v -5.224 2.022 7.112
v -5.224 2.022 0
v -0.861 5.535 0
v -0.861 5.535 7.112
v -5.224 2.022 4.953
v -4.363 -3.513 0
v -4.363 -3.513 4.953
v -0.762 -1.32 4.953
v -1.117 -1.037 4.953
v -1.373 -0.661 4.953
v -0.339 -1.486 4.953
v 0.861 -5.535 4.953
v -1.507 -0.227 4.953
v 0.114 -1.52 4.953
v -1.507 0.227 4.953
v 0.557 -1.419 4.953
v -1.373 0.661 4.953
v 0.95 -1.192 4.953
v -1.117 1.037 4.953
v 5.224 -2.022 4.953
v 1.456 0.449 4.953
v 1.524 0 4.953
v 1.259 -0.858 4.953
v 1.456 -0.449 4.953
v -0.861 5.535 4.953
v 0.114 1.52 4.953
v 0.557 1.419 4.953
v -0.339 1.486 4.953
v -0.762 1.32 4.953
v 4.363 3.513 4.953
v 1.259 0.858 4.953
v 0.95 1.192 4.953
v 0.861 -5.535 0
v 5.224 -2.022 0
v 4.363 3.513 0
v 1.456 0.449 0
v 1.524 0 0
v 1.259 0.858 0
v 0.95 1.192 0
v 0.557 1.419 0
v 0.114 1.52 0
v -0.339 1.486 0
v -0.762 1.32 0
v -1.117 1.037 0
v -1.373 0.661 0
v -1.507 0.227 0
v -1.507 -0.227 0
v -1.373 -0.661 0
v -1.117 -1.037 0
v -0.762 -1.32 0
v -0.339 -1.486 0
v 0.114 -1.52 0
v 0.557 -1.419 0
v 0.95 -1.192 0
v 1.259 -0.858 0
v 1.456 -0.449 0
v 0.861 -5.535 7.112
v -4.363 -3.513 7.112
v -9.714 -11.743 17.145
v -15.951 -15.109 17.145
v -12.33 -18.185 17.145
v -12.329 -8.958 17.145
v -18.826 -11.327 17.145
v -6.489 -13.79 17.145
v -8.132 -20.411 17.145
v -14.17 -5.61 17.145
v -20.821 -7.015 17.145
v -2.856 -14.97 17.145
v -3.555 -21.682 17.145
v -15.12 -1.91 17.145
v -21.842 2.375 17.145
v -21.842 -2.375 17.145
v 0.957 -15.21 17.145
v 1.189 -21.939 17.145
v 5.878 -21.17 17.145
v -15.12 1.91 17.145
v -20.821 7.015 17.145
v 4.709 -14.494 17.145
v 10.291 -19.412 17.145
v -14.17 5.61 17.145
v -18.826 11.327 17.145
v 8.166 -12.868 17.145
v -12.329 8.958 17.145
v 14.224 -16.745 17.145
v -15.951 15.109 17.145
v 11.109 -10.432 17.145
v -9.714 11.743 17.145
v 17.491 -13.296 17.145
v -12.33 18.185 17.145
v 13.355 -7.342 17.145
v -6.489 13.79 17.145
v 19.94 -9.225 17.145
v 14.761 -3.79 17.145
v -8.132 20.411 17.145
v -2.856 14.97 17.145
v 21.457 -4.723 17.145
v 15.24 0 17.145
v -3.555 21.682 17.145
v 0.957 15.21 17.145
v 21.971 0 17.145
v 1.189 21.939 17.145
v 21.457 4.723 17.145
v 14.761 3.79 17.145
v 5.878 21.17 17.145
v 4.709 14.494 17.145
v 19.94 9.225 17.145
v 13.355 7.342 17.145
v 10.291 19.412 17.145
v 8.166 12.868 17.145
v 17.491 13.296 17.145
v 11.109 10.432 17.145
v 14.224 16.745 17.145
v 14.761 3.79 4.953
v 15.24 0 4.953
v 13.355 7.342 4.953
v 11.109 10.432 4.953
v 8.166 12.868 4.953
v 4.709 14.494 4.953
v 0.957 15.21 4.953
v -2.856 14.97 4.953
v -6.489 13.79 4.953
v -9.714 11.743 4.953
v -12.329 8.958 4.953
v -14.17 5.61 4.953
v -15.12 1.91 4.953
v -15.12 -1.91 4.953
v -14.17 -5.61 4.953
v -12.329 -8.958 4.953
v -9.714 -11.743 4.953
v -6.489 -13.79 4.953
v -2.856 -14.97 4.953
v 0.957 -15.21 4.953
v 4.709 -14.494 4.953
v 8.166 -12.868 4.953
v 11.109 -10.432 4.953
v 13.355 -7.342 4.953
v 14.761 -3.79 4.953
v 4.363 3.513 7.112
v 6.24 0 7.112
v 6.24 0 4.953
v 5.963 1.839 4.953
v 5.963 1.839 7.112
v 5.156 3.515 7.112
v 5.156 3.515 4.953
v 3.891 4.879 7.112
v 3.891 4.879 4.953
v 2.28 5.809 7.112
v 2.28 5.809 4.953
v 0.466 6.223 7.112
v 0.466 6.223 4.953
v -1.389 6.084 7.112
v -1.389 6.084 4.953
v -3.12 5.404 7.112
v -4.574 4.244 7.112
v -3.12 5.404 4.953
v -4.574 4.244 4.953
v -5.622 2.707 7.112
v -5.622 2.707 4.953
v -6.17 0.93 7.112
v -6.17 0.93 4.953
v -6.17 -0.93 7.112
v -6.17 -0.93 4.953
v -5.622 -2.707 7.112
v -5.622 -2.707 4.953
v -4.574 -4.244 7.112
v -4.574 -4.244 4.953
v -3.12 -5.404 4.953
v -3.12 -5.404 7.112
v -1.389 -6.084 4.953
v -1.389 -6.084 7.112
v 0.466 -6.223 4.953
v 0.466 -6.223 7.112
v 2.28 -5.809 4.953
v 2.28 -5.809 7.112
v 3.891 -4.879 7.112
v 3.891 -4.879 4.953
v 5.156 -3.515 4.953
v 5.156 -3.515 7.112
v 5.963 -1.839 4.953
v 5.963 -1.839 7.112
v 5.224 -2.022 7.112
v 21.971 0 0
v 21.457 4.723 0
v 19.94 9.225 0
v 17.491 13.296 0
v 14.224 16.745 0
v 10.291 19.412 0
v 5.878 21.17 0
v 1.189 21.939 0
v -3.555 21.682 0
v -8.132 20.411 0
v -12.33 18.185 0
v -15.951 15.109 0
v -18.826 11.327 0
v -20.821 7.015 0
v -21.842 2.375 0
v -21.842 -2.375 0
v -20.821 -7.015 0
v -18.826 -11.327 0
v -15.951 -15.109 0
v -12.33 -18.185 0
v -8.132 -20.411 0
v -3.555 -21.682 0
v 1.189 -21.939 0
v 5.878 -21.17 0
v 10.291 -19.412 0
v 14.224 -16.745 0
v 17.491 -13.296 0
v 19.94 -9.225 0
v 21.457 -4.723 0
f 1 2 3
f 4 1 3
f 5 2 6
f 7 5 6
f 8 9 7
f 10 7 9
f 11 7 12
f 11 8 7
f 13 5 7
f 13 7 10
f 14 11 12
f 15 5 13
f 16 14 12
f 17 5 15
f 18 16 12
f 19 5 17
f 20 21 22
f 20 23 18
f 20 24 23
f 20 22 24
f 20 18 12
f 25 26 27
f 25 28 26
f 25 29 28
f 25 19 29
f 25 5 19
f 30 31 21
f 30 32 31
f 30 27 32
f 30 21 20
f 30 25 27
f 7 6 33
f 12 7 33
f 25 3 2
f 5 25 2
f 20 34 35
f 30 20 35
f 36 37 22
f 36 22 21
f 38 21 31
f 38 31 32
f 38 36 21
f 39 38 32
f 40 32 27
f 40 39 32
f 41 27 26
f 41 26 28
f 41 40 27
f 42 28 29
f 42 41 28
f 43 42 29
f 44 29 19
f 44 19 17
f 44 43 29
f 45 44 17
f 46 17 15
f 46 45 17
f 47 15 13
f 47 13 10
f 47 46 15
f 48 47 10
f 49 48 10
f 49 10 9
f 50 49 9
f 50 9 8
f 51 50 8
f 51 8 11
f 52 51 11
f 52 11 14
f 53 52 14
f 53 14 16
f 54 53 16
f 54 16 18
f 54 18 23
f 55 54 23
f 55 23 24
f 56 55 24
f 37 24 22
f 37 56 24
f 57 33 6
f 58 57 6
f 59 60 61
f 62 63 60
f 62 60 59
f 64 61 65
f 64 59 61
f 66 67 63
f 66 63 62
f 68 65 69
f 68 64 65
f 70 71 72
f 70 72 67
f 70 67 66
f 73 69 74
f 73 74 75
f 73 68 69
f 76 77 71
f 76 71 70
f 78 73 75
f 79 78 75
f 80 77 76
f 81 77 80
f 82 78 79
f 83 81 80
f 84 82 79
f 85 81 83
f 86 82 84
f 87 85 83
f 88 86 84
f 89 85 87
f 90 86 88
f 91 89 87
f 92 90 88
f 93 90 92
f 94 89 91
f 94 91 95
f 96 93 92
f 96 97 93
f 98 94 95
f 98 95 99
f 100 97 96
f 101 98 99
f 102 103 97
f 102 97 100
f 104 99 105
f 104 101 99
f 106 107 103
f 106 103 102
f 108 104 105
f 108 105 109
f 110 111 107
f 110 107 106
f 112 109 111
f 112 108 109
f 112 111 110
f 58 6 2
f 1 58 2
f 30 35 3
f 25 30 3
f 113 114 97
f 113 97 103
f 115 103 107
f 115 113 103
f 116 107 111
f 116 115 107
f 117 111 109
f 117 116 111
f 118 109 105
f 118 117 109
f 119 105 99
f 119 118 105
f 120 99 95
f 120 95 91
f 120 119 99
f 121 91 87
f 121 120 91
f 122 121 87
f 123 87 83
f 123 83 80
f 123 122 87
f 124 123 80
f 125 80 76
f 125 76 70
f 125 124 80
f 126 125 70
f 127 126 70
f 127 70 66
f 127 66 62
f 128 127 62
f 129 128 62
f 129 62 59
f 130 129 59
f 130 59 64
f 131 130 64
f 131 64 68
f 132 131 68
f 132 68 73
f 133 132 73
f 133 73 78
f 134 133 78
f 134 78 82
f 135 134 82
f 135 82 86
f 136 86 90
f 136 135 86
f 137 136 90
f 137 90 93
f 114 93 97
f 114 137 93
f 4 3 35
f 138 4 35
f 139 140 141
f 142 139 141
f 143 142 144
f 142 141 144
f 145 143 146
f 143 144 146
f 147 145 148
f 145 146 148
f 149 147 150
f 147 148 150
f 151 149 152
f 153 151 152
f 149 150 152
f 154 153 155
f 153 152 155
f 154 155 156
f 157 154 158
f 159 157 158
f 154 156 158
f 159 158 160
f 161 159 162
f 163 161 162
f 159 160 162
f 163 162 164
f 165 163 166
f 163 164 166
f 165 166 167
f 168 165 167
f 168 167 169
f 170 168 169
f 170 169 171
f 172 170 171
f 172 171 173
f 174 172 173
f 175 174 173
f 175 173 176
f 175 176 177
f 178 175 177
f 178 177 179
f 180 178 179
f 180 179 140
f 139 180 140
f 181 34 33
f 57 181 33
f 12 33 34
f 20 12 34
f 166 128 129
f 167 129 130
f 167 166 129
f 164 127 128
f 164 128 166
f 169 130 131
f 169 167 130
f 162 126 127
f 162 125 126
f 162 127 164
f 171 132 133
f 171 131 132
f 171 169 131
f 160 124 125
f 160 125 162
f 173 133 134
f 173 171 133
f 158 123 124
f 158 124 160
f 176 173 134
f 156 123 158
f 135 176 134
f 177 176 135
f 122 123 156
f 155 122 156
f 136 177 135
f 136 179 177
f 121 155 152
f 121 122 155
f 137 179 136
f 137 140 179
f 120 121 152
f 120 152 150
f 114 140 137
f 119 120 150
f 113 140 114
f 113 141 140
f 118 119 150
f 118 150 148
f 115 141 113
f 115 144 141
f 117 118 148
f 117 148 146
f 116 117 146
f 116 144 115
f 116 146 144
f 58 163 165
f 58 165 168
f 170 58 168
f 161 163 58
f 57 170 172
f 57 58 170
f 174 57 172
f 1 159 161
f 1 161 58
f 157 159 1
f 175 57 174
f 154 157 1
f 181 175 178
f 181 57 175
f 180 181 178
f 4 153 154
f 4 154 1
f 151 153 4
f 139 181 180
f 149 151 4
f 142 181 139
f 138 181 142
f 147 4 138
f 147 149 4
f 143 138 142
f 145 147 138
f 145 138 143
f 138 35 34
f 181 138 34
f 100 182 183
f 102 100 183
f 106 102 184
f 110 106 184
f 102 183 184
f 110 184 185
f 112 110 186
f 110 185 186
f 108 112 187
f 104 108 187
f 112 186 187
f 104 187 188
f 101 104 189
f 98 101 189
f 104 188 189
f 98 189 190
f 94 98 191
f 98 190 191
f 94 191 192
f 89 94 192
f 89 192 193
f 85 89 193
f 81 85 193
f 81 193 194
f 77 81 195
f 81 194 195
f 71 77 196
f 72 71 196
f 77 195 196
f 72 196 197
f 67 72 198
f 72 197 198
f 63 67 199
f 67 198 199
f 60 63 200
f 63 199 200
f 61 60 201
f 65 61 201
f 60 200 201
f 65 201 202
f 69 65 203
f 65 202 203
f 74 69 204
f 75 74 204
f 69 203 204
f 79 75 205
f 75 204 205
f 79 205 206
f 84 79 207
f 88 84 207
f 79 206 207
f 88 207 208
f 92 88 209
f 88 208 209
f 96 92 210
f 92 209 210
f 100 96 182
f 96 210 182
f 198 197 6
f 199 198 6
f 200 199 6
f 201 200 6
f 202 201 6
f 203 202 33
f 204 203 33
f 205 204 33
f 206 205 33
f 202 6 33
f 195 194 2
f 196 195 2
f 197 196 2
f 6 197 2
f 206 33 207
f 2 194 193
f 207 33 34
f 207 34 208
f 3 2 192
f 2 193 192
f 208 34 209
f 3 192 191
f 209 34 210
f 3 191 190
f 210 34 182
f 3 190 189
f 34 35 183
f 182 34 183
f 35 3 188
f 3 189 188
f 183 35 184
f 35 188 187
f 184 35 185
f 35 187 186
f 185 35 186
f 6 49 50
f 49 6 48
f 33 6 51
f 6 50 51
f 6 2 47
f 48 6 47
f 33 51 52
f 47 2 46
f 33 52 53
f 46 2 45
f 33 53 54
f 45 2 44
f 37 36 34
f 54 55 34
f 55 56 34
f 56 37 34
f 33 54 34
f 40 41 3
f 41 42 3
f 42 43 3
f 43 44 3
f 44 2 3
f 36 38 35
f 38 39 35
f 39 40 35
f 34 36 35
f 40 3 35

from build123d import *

# Parameters (mm, degrees)
F0_R     = 1.524
F1_DEPTH = 4.953
F0_R_2   = 6.240044
F2_DEPTH = 7.112
F3_R     = 15.494
F3_R_2   = 5.855876
F4_DEPTH = 4.953
F5_R     = 21.971
F5_R_2   = 15.24
F6_DEPTH = 17.145


with BuildPart() as f1:
    # F0 (on Top) → F1 (new body)
    with BuildSketch(Plane.XY):
        Polygon((-0.860959, 5.535358), (-5.224241, 2.022067), (-4.363281, -3.513292), (0.860959, -5.535358), (5.224241, -2.022067), (4.363281, 3.513292), align=None)
        Circle(F0_R, mode=Mode.SUBTRACT)
    extrude(amount=F1_DEPTH)


with BuildPart() as f2:
    # F0 (on Top) → F2 (new body)
    with BuildSketch(Plane.XY):
        Circle(F0_R_2)
        Polygon((-4.363281, -3.513292), (-5.224241, 2.022067), (-0.860959, 5.535358), (4.363281, 3.513292), (5.224241, -2.022067), (0.860959, -5.535358), align=None, mode=Mode.SUBTRACT)
    extrude(amount=F2_DEPTH)

    # F3 (on Top) → F4 (join)
    with BuildSketch(Plane.XY):
        Circle(F3_R)
        Circle(F3_R_2, mode=Mode.SUBTRACT)
    extrude(amount=F4_DEPTH)

    # F5 (on Top) → F6 (join)
    with BuildSketch(Plane.XY):
        Circle(F5_R)
        Circle(F5_R_2, mode=Mode.SUBTRACT)
    extrude(amount=F6_DEPTH)


solid = Compound([f1.part, f2.part])
